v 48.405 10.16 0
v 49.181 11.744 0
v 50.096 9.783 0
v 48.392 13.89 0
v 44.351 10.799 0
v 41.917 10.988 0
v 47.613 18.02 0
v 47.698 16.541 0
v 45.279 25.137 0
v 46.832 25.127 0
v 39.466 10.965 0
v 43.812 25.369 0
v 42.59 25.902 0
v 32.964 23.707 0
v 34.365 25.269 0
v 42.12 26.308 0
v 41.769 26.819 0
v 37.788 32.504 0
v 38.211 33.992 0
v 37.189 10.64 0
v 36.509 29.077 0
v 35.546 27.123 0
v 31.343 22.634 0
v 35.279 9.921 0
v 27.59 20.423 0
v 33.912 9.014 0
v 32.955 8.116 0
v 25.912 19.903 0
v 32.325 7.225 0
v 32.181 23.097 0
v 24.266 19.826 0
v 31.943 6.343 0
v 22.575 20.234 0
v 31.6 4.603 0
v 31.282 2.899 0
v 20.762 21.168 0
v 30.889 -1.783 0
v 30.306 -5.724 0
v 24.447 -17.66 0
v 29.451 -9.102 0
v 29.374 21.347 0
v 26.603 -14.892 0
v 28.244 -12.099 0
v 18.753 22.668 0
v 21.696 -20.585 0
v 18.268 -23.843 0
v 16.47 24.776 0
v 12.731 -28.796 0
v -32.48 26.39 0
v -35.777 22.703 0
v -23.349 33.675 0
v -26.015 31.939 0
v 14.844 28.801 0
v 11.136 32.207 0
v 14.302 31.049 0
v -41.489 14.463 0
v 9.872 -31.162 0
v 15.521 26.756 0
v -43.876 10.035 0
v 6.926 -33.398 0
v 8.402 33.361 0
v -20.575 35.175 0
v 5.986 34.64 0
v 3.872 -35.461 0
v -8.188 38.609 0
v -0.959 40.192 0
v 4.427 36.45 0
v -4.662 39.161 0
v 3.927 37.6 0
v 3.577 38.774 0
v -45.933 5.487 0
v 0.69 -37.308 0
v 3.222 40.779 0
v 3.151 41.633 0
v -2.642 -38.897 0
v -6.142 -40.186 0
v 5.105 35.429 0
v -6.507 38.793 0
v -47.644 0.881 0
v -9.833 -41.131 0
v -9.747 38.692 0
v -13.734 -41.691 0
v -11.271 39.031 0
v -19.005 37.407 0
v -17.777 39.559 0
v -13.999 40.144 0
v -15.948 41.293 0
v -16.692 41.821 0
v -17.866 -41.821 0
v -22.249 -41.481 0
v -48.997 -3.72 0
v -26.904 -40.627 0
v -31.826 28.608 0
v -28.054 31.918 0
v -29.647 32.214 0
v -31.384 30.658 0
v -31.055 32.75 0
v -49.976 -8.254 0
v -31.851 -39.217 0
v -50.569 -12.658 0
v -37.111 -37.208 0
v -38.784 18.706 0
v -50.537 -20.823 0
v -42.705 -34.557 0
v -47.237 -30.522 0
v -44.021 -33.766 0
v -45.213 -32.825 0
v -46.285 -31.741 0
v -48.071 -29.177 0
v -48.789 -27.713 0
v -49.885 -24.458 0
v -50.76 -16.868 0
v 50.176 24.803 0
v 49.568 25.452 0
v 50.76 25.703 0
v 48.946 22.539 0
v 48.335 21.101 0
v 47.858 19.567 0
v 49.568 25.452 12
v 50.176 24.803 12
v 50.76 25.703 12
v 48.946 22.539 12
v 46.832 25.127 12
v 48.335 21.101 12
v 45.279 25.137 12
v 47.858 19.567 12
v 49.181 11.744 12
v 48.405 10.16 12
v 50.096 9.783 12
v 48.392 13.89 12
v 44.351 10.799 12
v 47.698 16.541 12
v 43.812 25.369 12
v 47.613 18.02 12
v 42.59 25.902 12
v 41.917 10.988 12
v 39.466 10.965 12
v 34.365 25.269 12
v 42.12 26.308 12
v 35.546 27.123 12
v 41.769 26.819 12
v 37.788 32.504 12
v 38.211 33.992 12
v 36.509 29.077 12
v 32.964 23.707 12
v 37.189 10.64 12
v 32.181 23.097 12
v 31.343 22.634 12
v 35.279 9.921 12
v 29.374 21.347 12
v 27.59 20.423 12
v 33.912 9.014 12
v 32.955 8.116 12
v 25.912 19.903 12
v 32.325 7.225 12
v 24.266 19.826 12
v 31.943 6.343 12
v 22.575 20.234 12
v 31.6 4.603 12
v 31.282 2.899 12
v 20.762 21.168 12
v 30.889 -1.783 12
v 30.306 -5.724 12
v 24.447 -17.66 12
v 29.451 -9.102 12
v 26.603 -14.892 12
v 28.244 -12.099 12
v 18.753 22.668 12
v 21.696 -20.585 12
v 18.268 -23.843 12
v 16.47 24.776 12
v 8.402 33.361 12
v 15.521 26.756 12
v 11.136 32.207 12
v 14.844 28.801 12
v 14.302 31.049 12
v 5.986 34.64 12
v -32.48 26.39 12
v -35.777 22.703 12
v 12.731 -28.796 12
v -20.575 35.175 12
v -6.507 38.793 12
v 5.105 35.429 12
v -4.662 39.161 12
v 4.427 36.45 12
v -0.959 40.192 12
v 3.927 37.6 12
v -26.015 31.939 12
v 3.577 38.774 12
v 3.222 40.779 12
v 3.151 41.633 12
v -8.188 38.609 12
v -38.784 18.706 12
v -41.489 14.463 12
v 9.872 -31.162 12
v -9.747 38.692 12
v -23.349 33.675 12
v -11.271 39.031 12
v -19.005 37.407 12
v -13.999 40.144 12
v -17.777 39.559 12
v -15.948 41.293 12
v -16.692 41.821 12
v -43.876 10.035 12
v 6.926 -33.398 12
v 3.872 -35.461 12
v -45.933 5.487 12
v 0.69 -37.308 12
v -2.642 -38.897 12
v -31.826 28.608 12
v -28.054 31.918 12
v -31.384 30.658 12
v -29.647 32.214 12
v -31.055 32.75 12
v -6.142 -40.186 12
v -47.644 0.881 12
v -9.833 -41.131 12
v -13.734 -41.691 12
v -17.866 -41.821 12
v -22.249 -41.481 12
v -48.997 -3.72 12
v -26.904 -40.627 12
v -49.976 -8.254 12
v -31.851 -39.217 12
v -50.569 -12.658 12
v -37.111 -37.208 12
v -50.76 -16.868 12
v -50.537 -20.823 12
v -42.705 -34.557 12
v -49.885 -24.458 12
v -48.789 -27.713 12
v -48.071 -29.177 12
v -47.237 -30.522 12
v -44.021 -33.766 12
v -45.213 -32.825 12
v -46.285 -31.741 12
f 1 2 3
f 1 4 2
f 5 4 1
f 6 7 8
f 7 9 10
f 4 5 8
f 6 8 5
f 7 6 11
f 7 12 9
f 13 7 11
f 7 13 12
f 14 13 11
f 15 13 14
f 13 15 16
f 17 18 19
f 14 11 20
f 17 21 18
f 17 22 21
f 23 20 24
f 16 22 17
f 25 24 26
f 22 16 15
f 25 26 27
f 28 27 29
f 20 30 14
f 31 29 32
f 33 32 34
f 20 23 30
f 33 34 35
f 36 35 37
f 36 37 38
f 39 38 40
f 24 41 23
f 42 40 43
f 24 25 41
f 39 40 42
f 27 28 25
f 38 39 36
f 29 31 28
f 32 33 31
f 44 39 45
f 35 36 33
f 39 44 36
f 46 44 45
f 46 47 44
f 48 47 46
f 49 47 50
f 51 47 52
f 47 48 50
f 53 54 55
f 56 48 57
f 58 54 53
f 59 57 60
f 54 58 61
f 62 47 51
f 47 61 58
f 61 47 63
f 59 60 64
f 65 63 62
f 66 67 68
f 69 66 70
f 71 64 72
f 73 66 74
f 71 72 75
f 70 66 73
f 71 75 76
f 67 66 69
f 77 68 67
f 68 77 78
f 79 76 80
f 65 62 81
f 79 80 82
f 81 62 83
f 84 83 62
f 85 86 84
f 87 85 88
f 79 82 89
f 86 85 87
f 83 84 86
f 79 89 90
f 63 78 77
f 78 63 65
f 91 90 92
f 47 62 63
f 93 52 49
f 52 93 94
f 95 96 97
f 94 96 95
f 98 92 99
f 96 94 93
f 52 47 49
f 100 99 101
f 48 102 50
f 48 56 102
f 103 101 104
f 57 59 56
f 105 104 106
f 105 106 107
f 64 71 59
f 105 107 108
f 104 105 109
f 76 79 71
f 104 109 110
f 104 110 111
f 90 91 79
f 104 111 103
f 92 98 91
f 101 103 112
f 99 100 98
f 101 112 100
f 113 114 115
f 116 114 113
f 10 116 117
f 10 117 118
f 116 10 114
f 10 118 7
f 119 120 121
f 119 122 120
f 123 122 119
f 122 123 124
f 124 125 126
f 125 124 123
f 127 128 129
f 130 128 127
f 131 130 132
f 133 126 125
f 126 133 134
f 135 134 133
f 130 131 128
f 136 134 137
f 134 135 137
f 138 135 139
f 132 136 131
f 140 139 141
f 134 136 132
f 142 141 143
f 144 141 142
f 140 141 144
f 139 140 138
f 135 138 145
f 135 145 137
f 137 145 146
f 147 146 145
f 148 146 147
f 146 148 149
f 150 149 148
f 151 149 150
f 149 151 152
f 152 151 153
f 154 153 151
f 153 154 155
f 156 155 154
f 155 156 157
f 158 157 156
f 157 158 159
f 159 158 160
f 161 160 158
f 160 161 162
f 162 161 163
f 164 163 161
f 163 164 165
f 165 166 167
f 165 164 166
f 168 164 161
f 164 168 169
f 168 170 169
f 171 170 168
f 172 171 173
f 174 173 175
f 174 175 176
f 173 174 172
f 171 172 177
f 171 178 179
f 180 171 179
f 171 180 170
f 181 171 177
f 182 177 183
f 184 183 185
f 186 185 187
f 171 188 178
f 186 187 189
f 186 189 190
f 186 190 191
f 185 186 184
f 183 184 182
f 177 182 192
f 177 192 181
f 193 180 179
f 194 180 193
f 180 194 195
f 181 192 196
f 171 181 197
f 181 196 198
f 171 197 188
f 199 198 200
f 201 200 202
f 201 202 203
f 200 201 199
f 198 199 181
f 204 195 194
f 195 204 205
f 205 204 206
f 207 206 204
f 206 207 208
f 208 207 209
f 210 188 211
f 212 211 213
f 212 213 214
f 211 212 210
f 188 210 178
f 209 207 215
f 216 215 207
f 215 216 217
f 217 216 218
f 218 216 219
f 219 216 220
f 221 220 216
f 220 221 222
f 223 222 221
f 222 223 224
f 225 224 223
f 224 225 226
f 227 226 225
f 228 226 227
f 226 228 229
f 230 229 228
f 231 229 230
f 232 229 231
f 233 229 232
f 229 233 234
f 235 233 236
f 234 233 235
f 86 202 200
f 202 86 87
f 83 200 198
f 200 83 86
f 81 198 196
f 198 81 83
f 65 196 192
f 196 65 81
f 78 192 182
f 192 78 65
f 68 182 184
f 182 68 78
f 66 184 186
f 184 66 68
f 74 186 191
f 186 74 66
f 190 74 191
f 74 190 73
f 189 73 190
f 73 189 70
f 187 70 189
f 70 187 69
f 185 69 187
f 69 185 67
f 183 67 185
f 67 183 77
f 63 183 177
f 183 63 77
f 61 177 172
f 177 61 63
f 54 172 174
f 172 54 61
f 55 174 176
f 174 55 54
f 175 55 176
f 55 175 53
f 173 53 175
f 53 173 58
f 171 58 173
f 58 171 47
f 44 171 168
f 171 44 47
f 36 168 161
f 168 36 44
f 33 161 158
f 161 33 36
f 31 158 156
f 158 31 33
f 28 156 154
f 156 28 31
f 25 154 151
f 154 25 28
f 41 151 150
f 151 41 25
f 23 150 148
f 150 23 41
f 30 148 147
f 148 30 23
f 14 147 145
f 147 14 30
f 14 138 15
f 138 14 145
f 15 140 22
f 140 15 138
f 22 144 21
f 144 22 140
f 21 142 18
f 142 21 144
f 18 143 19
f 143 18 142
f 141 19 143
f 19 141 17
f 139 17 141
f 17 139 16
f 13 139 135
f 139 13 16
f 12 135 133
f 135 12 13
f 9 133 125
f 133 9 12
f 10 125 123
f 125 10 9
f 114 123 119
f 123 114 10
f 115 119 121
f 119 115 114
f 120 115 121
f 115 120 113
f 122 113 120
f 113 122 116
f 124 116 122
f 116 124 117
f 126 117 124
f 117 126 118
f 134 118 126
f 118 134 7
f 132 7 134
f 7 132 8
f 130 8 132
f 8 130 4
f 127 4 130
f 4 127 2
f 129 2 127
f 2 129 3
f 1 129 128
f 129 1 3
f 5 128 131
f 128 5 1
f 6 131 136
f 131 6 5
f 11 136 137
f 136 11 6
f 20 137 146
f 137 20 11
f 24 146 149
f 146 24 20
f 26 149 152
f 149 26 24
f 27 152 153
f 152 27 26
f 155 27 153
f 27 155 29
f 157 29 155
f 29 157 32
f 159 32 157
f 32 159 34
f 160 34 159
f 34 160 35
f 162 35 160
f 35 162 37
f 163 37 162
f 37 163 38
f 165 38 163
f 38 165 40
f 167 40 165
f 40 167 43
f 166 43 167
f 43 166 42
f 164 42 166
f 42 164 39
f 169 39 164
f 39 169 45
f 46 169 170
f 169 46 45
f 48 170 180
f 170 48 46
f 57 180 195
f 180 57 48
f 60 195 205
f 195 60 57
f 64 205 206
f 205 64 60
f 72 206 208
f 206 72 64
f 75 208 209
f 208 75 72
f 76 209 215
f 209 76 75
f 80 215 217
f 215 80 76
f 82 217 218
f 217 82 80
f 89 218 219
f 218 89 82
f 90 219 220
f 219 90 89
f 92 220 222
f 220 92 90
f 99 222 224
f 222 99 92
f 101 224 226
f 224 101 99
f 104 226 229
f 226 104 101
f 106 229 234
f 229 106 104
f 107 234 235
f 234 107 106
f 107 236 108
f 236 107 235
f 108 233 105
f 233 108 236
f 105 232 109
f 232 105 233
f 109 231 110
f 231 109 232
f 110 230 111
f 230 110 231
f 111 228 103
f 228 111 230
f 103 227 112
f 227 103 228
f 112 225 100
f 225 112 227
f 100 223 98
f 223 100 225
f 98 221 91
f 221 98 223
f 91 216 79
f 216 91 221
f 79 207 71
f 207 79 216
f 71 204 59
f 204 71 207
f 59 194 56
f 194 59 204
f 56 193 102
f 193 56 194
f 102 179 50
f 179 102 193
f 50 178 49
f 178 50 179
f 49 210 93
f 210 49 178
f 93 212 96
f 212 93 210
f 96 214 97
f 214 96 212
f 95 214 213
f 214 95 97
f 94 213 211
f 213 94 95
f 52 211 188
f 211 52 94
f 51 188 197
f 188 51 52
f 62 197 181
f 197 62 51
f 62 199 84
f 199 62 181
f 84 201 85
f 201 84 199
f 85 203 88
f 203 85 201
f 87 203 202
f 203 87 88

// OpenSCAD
// Generated by inkscape 0.92.5 (2060ec1f9f, 2020-04-08) + inkscape-paths2openscad 0.25
// Sun Feb  7 17:20:35 2021 from "anglerfish.svg"

// Module names are of the form poly_<inkscape-path-id>().  As a result,
// you can associate a polygon in this OpenSCAD program with the corresponding
// SVG element in the Inkscape document by looking for the XML element with
// the attribute id="inkscape-path-id".

// fudge value is used to ensure that subtracted solids are a tad taller
// in the z dimension than the polygon being subtracted from.  This helps
// keep the resulting .stl file manifold.
fudge = 0.1;
zsize = 12;
line_fn = 4;
min_line_width = 1.0;
line_width_scale = 1.0;
function min_line_mm(w) = max(min_line_width, w * line_width_scale) * 96/25.4;


path815_0_center = [-36.661346,-12.351608];
path815_0_points = [[-130.947070,-12.351608],[-130.117912,-0.051788],[-127.683325,11.876461],[-123.722637,23.297819],[-118.315178,34.076966],[-111.540276,44.078582],[-103.477262,53.167346],[-94.205462,61.207940],[-83.804208,68.065041],[-72.573796,73.507760],[-60.867409,77.395416],[-48.843707,79.728009],[-36.661346,80.505540],[-24.478986,79.728009],[-12.455283,77.395416],[-0.748897,73.507760],[10.481515,68.065041],[20.882770,61.207940],[30.154569,53.167346],[38.217584,44.078582],[44.992485,34.076966],[50.399944,23.297819],[54.360632,11.876461],[56.795219,-0.051788],[57.624377,-12.351608],[56.795219,-24.651428],[54.360632,-36.579677],[50.399944,-48.001035],[44.992485,-58.780182],[38.217584,-68.781798],[30.154569,-77.870563],[20.882770,-85.911156],[10.481515,-92.768258],[-0.748897,-98.210976],[-12.455283,-102.098632],[-24.478986,-104.431225],[-36.661346,-105.208757],[-48.843707,-104.431225],[-60.867409,-102.098632],[-72.573796,-98.210976],[-83.804208,-92.768258],[-94.205462,-85.911156],[-103.477262,-77.870563],[-111.540276,-68.781798],[-118.315178,-58.780182],[-123.722637,-48.001035],[-127.683325,-36.579677],[-130.117912,-24.651428],[-130.947070,-12.351608]];
module poly_path815(h, w, s, res=line_fn)
{
  scale([25.4/96, -25.4/96, 1]) union()
  {
    translate (path815_0_center) linear_extrude(height=h, convexity=10, scale=0.01*s)
      translate (-path815_0_center) polygon(path815_0_points);
  }
}

path821_0_center = [-0.000000,0.000000];
path821_0_points = [[144.419765,-128.474221],[142.819017,-122.850026],[137.987891,-109.898933],[134.347398,-102.513999],[129.883064,-95.503180],[124.589474,-89.601756],[121.630015,-87.296842],[118.461212,-85.545006],[111.021412,-80.683102],[104.275289,-77.191014],[97.935065,-75.222972],[91.712963,-74.933203],[85.321205,-76.475934],[78.472013,-80.005393],[70.877609,-85.675808],[62.250216,-93.641407],[58.663896,-101.124570],[56.102250,-108.855389],[54.052945,-117.352340],[42.089075,-121.726781],[31.754541,-126.090237],[22.625212,-130.922651],[19.293714,-133.904005],[16.732266,-137.764344],[14.840434,-142.110226],[13.517786,-146.548211],[12.178306,-154.126722],[11.910361,-157.352344],[-3.625492,-151.905357],[-17.621124,-148.009883],[-24.593813,-146.618852],[-30.947064,-145.922653],[-36.839911,-146.239325],[-42.598809,-147.518590],[-52.911215,-151.726084],[-60.277191,-156.067509],[-63.089647,-158.065234],[-67.189742,-149.513970],[-71.829269,-141.380304],[-77.763479,-132.946091],[-88.248925,-127.274612],[-98.325981,-120.713670],[-106.030338,-120.635960],[-112.053040,-121.751909],[-117.374803,-123.780080],[-118.618143,-115.872226],[-120.288027,-108.123306],[-122.759573,-99.742968],[-135.218748,-85.805883],[-146.585675,-70.699610],[-156.807439,-54.661546],[-165.831126,-37.929089],[-173.603819,-20.739635],[-180.072604,-3.330582],[-185.184564,14.060674],[-188.886786,31.196736],[-191.126353,47.840206],[-191.850350,63.753687],[-191.005861,78.699782],[-188.539973,92.441095],[-184.399768,104.740227],[-181.685262,110.274790],[-178.532333,115.359783],[-174.934367,119.965533],[-170.884751,124.062365],[-166.376869,127.620604],[-161.404107,130.610576],[-140.263814,140.628656],[-120.383125,148.222149],[-101.684621,153.552066],[-84.090883,156.779424],[-67.524492,158.065234],[-51.908027,157.570511],[-37.164070,155.456269],[-23.215202,151.883521],[-9.984002,147.013281],[2.606948,141.006563],[14.635069,134.024380],[26.177778,126.227747],[37.312496,117.777677],[48.116642,108.835184],[69.042897,90.116982],[82.000599,77.800271],[92.399750,66.748149],[100.546878,56.282979],[106.748512,45.727125],[111.311181,34.402951],[114.541413,21.632822],[116.745737,6.739101],[118.230682,-10.955849],[119.434650,-17.398378],[120.730035,-23.972311],[122.173184,-27.307033],[124.552600,-30.672779],[128.172753,-34.068942],[133.338113,-37.494911],[140.558297,-40.214945],[149.161913,-41.443179],[158.425842,-41.527631],[167.626963,-40.816322],[182.948300,-38.398495],[189.340959,-36.973851],[185.880741,-44.387611],[182.899155,-52.497963],[180.277638,-62.515654],[179.954594,-68.105276],[180.880523,-73.953569],[182.683742,-79.751093],[184.992570,-85.188413],[189.640329,-93.744685],[191.850350,-97.146888],[187.344322,-96.198257],[177.002490,-94.968414],[171.132017,-95.005559],[165.589236,-95.881427],[160.969693,-97.899027],[159.192244,-99.430667],[157.868936,-101.361368],[144.419765,-128.474221],[144.419765,-128.474221]];
module poly_path821(h, w, s, res=line_fn)
{
  scale([25.4/96, -25.4/96, 1]) union()
  {
    translate (path821_0_center) linear_extrude(height=h, convexity=10, scale=0.01*s)
      translate (-path821_0_center) polygon(path821_0_points);
  }
}

module anglerfish_00(h)
{
  difference()
  {
    union()
    {
      translate ([0,0,0]) poly_path815(h, min_line_mm(1.0), 100.0);
      translate ([0,0,0]) poly_path821(h, min_line_mm(0.264583317458), 100.0);
    }
    union()
    {
    }
  }
}

anglerfish_00(zsize);
